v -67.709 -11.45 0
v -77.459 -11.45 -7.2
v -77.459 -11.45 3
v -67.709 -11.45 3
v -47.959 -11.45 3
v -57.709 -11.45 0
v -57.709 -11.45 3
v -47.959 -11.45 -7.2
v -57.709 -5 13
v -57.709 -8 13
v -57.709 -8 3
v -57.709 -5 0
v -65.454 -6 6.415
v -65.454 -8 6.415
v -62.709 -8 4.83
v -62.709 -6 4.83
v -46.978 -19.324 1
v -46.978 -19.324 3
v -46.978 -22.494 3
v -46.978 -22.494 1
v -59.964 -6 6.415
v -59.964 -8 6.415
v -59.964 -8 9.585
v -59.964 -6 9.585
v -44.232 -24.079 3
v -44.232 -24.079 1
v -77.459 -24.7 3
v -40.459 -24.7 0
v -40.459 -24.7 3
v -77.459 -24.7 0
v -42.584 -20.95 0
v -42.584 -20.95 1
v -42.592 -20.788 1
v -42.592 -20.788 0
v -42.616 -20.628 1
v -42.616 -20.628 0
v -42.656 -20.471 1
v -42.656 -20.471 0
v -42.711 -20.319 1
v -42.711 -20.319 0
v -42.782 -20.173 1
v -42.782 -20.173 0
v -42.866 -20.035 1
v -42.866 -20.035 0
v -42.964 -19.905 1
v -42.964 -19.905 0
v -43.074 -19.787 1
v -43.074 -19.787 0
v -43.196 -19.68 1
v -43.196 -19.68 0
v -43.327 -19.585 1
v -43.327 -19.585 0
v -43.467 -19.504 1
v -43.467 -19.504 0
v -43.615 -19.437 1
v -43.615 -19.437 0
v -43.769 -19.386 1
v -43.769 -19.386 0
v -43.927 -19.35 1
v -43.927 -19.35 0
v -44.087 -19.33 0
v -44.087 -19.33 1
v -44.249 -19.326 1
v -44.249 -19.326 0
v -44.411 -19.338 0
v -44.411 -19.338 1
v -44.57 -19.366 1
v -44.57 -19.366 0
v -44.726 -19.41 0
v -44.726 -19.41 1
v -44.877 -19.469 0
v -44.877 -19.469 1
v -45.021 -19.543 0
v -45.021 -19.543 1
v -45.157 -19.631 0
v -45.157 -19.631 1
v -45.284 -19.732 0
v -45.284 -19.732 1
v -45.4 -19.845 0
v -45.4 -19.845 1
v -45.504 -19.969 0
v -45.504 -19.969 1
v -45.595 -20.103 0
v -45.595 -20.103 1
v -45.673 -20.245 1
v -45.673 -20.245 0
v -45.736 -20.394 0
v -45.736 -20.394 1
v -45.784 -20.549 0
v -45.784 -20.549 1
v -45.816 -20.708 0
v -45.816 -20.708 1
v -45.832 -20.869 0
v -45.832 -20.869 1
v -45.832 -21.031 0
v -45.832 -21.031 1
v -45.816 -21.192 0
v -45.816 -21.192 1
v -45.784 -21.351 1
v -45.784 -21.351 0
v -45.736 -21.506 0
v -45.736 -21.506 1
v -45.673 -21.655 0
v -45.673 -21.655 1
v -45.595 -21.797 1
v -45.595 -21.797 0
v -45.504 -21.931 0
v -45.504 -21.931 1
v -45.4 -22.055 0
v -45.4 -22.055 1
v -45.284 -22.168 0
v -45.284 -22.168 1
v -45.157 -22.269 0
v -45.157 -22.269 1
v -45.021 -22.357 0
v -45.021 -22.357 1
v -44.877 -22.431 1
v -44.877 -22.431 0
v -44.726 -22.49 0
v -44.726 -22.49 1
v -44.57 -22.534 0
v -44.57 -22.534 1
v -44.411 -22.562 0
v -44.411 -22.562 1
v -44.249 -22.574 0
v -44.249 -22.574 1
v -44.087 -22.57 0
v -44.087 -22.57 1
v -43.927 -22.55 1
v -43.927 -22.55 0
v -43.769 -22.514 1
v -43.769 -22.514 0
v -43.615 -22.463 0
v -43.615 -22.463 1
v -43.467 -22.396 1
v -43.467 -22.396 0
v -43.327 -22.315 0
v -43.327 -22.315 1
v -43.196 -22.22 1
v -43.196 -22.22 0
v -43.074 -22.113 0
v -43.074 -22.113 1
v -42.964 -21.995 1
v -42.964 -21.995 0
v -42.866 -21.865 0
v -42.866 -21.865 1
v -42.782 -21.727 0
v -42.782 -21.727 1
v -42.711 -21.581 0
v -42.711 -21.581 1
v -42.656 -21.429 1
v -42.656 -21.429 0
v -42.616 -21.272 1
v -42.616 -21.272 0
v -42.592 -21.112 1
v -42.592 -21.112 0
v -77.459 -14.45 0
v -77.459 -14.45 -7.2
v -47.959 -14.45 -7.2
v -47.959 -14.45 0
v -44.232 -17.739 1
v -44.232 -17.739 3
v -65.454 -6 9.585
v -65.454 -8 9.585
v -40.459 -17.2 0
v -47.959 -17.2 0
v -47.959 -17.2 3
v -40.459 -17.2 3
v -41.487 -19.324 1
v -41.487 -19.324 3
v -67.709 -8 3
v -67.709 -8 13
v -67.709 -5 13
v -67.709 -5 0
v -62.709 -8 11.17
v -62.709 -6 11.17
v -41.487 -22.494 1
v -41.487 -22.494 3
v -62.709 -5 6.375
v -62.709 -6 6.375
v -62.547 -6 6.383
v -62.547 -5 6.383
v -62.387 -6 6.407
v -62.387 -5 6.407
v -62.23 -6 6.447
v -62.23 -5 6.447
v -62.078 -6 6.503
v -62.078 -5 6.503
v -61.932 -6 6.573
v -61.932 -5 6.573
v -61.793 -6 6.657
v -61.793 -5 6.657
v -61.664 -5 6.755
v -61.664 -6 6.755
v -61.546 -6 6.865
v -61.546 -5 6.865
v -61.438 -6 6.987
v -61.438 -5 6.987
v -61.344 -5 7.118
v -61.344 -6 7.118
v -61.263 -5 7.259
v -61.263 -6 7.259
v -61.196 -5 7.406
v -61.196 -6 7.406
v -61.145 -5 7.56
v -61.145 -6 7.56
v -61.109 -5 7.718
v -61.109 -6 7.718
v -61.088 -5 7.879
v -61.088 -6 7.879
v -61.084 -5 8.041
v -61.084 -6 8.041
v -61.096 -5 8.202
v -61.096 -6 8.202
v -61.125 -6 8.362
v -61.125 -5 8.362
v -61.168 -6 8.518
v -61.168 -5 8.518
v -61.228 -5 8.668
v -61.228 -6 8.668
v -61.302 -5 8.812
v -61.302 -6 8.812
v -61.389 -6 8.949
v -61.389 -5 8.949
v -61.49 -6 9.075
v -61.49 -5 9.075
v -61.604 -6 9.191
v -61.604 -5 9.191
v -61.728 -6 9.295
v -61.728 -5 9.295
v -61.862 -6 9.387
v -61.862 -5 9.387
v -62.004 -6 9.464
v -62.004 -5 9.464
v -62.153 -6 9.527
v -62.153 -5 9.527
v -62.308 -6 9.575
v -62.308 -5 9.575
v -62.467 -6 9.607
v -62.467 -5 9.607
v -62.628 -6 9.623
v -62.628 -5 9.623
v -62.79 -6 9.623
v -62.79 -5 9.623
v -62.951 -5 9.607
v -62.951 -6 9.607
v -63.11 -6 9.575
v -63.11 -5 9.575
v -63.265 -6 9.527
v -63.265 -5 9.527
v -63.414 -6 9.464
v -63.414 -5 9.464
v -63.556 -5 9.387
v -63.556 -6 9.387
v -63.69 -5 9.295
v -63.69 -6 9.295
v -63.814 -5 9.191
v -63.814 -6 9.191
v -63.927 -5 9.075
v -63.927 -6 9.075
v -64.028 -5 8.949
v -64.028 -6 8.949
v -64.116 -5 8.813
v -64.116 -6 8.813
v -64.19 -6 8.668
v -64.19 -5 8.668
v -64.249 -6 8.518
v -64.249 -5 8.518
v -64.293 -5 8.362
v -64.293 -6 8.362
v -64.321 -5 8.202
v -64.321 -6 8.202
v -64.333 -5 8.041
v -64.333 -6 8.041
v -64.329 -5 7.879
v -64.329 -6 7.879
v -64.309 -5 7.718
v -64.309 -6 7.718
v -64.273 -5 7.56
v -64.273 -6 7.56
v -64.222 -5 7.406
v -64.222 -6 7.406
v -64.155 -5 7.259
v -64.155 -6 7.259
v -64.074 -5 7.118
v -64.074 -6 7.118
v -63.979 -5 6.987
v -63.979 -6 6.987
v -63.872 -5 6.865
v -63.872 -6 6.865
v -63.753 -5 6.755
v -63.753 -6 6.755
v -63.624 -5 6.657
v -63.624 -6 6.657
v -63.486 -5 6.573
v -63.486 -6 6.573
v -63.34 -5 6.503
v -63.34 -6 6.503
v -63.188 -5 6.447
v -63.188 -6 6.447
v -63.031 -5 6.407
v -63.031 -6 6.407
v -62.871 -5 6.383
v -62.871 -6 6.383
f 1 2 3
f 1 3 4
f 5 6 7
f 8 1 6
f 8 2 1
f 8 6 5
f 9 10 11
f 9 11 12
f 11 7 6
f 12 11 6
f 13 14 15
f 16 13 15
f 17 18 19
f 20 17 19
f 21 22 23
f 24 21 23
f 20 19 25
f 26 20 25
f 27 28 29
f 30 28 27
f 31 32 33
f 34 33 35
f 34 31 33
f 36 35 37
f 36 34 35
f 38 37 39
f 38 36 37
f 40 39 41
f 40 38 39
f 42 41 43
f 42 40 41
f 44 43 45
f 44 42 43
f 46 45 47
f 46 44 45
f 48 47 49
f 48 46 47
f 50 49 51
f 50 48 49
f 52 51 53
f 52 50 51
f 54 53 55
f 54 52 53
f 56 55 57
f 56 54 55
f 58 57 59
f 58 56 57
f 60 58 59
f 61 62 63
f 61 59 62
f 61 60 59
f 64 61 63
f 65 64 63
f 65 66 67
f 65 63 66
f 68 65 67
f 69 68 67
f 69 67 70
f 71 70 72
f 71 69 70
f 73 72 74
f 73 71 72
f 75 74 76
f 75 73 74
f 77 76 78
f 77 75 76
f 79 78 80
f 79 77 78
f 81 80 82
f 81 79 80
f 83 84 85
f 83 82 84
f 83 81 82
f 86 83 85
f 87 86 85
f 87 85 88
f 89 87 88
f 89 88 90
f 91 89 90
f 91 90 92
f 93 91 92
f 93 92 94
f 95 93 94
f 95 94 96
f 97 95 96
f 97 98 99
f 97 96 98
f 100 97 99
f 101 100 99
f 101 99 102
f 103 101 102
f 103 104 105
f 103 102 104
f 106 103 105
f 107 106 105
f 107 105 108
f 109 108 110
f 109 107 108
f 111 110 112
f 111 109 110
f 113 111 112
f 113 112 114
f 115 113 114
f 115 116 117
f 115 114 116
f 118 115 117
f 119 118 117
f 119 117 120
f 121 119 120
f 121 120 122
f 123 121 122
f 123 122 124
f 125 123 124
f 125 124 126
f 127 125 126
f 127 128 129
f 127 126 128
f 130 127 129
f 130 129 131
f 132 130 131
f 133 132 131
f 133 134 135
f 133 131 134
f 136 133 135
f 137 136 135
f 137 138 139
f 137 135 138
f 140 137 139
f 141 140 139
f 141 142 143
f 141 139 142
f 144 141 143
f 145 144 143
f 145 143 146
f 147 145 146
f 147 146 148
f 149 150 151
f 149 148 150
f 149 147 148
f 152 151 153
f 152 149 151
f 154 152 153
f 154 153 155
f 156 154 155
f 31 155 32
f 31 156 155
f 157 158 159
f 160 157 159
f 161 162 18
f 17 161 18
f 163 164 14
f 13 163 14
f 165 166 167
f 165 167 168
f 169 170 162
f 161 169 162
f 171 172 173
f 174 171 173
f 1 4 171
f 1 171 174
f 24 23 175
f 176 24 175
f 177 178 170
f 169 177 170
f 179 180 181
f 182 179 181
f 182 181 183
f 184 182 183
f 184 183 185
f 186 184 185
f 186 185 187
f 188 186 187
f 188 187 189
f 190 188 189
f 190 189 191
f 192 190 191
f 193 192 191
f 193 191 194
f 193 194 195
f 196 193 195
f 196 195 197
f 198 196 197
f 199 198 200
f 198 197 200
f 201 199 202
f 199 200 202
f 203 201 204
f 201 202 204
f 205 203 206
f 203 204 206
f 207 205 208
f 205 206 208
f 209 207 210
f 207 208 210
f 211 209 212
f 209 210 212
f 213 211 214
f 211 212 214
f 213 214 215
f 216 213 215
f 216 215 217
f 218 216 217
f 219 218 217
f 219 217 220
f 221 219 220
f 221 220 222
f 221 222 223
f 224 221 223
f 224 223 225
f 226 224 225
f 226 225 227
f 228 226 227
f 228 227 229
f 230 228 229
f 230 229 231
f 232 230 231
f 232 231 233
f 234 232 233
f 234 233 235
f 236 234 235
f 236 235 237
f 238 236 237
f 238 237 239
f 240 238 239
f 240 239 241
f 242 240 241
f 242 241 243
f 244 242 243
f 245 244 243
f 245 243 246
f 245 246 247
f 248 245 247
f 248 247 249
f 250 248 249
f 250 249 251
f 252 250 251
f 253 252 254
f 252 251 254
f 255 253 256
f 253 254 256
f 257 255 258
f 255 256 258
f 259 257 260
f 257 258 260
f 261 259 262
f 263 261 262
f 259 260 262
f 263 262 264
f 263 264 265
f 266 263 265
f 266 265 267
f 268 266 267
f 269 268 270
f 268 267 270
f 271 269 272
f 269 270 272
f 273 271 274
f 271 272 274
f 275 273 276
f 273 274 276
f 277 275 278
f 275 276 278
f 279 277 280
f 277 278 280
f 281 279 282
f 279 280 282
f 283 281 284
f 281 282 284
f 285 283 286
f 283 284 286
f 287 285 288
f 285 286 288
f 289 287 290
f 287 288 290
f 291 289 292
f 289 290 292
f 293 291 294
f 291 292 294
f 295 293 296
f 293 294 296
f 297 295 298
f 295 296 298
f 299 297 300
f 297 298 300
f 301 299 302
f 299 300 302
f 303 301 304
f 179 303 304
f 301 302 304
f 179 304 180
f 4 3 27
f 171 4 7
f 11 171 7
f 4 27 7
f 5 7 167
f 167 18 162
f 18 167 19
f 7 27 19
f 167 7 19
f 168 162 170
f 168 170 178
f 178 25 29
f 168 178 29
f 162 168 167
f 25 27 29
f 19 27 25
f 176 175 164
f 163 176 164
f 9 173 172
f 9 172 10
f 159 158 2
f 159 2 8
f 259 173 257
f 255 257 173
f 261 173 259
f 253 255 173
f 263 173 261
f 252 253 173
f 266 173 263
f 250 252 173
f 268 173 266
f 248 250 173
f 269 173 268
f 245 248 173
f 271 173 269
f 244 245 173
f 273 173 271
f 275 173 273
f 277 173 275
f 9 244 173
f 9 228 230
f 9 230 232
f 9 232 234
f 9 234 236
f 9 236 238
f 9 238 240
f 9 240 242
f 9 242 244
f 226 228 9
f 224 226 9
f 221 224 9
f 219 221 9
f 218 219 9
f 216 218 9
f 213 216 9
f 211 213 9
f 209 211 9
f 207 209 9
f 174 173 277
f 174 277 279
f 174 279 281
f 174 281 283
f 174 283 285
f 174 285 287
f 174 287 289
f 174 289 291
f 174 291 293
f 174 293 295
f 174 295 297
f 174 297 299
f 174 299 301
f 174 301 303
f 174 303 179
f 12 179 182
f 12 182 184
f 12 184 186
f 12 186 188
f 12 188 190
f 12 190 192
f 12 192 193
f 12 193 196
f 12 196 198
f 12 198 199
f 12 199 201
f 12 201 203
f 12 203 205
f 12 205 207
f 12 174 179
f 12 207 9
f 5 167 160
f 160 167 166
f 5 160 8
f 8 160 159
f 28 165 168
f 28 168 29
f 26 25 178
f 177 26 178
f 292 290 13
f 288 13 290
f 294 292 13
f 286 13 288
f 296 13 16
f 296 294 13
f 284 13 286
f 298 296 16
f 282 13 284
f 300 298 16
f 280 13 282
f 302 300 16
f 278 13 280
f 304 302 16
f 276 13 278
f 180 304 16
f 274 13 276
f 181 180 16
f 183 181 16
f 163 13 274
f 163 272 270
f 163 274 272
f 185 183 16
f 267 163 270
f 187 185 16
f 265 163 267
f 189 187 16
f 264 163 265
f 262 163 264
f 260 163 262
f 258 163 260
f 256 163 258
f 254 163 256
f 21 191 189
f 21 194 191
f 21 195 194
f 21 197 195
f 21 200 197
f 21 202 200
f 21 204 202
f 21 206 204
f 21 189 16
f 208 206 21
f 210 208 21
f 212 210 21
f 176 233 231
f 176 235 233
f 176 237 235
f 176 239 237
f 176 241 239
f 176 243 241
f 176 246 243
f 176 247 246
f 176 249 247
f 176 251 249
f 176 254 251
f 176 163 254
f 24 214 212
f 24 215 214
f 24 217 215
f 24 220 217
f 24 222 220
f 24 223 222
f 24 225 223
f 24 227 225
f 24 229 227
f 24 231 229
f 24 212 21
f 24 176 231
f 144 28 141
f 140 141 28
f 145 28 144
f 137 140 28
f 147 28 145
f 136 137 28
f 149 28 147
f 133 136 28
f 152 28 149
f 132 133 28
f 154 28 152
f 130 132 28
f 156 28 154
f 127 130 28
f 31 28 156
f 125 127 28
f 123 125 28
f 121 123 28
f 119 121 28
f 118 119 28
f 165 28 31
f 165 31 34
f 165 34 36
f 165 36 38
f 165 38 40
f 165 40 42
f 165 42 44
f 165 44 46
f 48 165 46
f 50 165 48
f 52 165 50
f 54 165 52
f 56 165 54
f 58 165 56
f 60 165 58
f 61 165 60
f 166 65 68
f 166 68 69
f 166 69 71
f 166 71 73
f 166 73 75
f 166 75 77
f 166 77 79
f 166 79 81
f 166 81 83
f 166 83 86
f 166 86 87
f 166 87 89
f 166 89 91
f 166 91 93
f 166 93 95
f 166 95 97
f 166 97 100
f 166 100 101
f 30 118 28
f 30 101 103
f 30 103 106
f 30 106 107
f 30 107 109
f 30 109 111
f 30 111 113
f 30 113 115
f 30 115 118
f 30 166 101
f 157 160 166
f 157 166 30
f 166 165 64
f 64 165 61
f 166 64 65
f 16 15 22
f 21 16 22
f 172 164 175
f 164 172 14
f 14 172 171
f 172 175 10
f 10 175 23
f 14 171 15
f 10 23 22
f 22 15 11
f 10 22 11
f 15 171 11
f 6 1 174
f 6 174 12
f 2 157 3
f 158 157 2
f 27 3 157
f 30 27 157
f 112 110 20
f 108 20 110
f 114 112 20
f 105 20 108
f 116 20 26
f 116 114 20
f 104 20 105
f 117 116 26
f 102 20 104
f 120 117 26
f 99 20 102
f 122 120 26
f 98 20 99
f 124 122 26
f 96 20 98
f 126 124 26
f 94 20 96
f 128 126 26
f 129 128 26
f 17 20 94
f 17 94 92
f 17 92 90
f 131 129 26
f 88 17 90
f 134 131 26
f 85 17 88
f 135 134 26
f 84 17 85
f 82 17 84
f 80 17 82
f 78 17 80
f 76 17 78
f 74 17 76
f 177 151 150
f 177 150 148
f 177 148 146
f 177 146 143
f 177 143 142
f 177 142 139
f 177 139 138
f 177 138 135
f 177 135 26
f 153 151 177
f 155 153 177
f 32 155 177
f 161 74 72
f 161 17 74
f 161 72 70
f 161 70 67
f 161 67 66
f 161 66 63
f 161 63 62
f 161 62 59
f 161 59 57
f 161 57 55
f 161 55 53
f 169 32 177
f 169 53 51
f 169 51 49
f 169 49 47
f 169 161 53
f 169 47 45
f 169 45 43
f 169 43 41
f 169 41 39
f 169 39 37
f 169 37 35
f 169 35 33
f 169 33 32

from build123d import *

# Parameters (mm, degrees)
CROQUIS1_R              = 1.625
SALIENTE_EXTRUIR1_DEPTH = 3
CORTAR_EXTRUIR1_DEPTH   = 2
CROQUIS4_W              = 29.5
CROQUIS4_H              = 10.2
SALIENTE_EXTRUIR2_DEPTH = 3
SALIENTE_EXTRUIR3_DEPTH = 3
CROQUIS7_W              = 10
CROQUIS7_H              = 3
SALIENTE_EXTRUIR4_DEPTH = 5
CROQUIS9_W              = 10
CROQUIS9_H              = 3
SALIENTE_EXTRUIR5_DEPTH = 10
CROQUIS10_R             = 1.625
CORTAR_EXTRUIR2_DEPTH   = 3
CORTAR_EXTRUIR3_DEPTH   = 2
CORTAR_EXTRUIR4_START   = -10
CROQUIS12_W             = 3
CROQUIS12_H             = 5
CORTAR_EXTRUIR4_DEPTH   = 10


with BuildPart() as part:
    # Croquis1 → Saliente-Extruir1 (new body)
    with BuildSketch(Plane.XY):
        Polygon((-40.458841365, -24.7), (-77.458841365, -24.7), (-77.458841365, -14.45), (-47.958841365, -14.45), (-47.958841365, -17.2), (-40.458841365, -17.2), align=None)
        with Locations((-44.208841365, -20.95)):
            Circle(CROQUIS1_R, mode=Mode.SUBTRACT)
    extrude(amount=SALIENTE_EXTRUIR1_DEPTH)

    # Croquis2 → Cortar-Extruir1 (cut)
    with BuildSketch(Plane.XY.offset(3)):
        Polygon((-44.232492922, -17.739034302), (-46.977793452, -19.324034302), (-46.977793452, -22.494034302), (-44.232492922, -24.079034302), (-41.487192392, -22.494034302), (-41.487192392, -19.324034302), align=None)
    extrude(amount=-CORTAR_EXTRUIR1_DEPTH, mode=Mode.SUBTRACT)

    # Croquis4 → Saliente-Extruir2 (add)
    with BuildSketch(Plane(origin=(0, -14.45, 0), x_dir=(1, 0, 0), z_dir=(0, 1, 0))):
        with Locations((-62.708841365, 2.1)):
            Rectangle(CROQUIS4_W, CROQUIS4_H)
    extrude(amount=SALIENTE_EXTRUIR2_DEPTH)

    # Croquis6 → Saliente-Extruir3 (add)
    with BuildSketch(Plane.XY.offset(3)):
        Polygon((-62.708841365, -11.45), (-67.708841365, -11.45), (-67.708841365, -5), (-57.708841365, -5), (-57.708841365, -11.45), align=None)
    extrude(amount=-SALIENTE_EXTRUIR3_DEPTH)

    # Croquis7 → Saliente-Extruir4 (add)
    with BuildSketch(Plane(origin=(0, -5, 0), x_dir=(1, 0, 0), z_dir=(0, 1, 0))):
        with Locations((-62.708841365, -1.5)):
            Rectangle(CROQUIS7_W, CROQUIS7_H)
    extrude(amount=SALIENTE_EXTRUIR4_DEPTH)

    # Croquis9 → Saliente-Extruir5 (add)
    with BuildSketch(Plane.XY.offset(3)):
        with Locations((-62.708841365, -6.5)):
            Rectangle(CROQUIS9_W, CROQUIS9_H)
    extrude(amount=SALIENTE_EXTRUIR5_DEPTH)

    # Croquis10 → Cortar-Extruir2 (cut)
    with BuildSketch(Plane.XZ.offset(8)):
        with Locations(Location((-62.708841365, 8, 0), (0, 0, 270))):
            Circle(CROQUIS10_R)
    extrude(amount=-CORTAR_EXTRUIR2_DEPTH, mode=Mode.SUBTRACT)

    # Croquis11 → Cortar-Extruir3 (cut)
    with BuildSketch(Plane.XZ.offset(8)):
        Polygon((-62.708841365, 4.83), (-59.963540835, 6.415), (-59.963540835, 9.585), (-62.708841365, 11.17), (-65.454141895, 9.585), (-65.454141895, 6.415), align=None)
    extrude(amount=-CORTAR_EXTRUIR3_DEPTH, mode=Mode.SUBTRACT)

    # Croquis12 → Cortar-Extruir4 (cut)
    with BuildSketch(Plane(origin=(-57.708841365, 0, 0), x_dir=(0, 0, -1), z_dir=(1, 0, 0)).offset(CORTAR_EXTRUIR4_START)):
        with Locations((-1.5, -2.5)):
            Rectangle(CROQUIS12_W, CROQUIS12_H)
    extrude(amount=CORTAR_EXTRUIR4_DEPTH, mode=Mode.SUBTRACT)


solid = part.part
